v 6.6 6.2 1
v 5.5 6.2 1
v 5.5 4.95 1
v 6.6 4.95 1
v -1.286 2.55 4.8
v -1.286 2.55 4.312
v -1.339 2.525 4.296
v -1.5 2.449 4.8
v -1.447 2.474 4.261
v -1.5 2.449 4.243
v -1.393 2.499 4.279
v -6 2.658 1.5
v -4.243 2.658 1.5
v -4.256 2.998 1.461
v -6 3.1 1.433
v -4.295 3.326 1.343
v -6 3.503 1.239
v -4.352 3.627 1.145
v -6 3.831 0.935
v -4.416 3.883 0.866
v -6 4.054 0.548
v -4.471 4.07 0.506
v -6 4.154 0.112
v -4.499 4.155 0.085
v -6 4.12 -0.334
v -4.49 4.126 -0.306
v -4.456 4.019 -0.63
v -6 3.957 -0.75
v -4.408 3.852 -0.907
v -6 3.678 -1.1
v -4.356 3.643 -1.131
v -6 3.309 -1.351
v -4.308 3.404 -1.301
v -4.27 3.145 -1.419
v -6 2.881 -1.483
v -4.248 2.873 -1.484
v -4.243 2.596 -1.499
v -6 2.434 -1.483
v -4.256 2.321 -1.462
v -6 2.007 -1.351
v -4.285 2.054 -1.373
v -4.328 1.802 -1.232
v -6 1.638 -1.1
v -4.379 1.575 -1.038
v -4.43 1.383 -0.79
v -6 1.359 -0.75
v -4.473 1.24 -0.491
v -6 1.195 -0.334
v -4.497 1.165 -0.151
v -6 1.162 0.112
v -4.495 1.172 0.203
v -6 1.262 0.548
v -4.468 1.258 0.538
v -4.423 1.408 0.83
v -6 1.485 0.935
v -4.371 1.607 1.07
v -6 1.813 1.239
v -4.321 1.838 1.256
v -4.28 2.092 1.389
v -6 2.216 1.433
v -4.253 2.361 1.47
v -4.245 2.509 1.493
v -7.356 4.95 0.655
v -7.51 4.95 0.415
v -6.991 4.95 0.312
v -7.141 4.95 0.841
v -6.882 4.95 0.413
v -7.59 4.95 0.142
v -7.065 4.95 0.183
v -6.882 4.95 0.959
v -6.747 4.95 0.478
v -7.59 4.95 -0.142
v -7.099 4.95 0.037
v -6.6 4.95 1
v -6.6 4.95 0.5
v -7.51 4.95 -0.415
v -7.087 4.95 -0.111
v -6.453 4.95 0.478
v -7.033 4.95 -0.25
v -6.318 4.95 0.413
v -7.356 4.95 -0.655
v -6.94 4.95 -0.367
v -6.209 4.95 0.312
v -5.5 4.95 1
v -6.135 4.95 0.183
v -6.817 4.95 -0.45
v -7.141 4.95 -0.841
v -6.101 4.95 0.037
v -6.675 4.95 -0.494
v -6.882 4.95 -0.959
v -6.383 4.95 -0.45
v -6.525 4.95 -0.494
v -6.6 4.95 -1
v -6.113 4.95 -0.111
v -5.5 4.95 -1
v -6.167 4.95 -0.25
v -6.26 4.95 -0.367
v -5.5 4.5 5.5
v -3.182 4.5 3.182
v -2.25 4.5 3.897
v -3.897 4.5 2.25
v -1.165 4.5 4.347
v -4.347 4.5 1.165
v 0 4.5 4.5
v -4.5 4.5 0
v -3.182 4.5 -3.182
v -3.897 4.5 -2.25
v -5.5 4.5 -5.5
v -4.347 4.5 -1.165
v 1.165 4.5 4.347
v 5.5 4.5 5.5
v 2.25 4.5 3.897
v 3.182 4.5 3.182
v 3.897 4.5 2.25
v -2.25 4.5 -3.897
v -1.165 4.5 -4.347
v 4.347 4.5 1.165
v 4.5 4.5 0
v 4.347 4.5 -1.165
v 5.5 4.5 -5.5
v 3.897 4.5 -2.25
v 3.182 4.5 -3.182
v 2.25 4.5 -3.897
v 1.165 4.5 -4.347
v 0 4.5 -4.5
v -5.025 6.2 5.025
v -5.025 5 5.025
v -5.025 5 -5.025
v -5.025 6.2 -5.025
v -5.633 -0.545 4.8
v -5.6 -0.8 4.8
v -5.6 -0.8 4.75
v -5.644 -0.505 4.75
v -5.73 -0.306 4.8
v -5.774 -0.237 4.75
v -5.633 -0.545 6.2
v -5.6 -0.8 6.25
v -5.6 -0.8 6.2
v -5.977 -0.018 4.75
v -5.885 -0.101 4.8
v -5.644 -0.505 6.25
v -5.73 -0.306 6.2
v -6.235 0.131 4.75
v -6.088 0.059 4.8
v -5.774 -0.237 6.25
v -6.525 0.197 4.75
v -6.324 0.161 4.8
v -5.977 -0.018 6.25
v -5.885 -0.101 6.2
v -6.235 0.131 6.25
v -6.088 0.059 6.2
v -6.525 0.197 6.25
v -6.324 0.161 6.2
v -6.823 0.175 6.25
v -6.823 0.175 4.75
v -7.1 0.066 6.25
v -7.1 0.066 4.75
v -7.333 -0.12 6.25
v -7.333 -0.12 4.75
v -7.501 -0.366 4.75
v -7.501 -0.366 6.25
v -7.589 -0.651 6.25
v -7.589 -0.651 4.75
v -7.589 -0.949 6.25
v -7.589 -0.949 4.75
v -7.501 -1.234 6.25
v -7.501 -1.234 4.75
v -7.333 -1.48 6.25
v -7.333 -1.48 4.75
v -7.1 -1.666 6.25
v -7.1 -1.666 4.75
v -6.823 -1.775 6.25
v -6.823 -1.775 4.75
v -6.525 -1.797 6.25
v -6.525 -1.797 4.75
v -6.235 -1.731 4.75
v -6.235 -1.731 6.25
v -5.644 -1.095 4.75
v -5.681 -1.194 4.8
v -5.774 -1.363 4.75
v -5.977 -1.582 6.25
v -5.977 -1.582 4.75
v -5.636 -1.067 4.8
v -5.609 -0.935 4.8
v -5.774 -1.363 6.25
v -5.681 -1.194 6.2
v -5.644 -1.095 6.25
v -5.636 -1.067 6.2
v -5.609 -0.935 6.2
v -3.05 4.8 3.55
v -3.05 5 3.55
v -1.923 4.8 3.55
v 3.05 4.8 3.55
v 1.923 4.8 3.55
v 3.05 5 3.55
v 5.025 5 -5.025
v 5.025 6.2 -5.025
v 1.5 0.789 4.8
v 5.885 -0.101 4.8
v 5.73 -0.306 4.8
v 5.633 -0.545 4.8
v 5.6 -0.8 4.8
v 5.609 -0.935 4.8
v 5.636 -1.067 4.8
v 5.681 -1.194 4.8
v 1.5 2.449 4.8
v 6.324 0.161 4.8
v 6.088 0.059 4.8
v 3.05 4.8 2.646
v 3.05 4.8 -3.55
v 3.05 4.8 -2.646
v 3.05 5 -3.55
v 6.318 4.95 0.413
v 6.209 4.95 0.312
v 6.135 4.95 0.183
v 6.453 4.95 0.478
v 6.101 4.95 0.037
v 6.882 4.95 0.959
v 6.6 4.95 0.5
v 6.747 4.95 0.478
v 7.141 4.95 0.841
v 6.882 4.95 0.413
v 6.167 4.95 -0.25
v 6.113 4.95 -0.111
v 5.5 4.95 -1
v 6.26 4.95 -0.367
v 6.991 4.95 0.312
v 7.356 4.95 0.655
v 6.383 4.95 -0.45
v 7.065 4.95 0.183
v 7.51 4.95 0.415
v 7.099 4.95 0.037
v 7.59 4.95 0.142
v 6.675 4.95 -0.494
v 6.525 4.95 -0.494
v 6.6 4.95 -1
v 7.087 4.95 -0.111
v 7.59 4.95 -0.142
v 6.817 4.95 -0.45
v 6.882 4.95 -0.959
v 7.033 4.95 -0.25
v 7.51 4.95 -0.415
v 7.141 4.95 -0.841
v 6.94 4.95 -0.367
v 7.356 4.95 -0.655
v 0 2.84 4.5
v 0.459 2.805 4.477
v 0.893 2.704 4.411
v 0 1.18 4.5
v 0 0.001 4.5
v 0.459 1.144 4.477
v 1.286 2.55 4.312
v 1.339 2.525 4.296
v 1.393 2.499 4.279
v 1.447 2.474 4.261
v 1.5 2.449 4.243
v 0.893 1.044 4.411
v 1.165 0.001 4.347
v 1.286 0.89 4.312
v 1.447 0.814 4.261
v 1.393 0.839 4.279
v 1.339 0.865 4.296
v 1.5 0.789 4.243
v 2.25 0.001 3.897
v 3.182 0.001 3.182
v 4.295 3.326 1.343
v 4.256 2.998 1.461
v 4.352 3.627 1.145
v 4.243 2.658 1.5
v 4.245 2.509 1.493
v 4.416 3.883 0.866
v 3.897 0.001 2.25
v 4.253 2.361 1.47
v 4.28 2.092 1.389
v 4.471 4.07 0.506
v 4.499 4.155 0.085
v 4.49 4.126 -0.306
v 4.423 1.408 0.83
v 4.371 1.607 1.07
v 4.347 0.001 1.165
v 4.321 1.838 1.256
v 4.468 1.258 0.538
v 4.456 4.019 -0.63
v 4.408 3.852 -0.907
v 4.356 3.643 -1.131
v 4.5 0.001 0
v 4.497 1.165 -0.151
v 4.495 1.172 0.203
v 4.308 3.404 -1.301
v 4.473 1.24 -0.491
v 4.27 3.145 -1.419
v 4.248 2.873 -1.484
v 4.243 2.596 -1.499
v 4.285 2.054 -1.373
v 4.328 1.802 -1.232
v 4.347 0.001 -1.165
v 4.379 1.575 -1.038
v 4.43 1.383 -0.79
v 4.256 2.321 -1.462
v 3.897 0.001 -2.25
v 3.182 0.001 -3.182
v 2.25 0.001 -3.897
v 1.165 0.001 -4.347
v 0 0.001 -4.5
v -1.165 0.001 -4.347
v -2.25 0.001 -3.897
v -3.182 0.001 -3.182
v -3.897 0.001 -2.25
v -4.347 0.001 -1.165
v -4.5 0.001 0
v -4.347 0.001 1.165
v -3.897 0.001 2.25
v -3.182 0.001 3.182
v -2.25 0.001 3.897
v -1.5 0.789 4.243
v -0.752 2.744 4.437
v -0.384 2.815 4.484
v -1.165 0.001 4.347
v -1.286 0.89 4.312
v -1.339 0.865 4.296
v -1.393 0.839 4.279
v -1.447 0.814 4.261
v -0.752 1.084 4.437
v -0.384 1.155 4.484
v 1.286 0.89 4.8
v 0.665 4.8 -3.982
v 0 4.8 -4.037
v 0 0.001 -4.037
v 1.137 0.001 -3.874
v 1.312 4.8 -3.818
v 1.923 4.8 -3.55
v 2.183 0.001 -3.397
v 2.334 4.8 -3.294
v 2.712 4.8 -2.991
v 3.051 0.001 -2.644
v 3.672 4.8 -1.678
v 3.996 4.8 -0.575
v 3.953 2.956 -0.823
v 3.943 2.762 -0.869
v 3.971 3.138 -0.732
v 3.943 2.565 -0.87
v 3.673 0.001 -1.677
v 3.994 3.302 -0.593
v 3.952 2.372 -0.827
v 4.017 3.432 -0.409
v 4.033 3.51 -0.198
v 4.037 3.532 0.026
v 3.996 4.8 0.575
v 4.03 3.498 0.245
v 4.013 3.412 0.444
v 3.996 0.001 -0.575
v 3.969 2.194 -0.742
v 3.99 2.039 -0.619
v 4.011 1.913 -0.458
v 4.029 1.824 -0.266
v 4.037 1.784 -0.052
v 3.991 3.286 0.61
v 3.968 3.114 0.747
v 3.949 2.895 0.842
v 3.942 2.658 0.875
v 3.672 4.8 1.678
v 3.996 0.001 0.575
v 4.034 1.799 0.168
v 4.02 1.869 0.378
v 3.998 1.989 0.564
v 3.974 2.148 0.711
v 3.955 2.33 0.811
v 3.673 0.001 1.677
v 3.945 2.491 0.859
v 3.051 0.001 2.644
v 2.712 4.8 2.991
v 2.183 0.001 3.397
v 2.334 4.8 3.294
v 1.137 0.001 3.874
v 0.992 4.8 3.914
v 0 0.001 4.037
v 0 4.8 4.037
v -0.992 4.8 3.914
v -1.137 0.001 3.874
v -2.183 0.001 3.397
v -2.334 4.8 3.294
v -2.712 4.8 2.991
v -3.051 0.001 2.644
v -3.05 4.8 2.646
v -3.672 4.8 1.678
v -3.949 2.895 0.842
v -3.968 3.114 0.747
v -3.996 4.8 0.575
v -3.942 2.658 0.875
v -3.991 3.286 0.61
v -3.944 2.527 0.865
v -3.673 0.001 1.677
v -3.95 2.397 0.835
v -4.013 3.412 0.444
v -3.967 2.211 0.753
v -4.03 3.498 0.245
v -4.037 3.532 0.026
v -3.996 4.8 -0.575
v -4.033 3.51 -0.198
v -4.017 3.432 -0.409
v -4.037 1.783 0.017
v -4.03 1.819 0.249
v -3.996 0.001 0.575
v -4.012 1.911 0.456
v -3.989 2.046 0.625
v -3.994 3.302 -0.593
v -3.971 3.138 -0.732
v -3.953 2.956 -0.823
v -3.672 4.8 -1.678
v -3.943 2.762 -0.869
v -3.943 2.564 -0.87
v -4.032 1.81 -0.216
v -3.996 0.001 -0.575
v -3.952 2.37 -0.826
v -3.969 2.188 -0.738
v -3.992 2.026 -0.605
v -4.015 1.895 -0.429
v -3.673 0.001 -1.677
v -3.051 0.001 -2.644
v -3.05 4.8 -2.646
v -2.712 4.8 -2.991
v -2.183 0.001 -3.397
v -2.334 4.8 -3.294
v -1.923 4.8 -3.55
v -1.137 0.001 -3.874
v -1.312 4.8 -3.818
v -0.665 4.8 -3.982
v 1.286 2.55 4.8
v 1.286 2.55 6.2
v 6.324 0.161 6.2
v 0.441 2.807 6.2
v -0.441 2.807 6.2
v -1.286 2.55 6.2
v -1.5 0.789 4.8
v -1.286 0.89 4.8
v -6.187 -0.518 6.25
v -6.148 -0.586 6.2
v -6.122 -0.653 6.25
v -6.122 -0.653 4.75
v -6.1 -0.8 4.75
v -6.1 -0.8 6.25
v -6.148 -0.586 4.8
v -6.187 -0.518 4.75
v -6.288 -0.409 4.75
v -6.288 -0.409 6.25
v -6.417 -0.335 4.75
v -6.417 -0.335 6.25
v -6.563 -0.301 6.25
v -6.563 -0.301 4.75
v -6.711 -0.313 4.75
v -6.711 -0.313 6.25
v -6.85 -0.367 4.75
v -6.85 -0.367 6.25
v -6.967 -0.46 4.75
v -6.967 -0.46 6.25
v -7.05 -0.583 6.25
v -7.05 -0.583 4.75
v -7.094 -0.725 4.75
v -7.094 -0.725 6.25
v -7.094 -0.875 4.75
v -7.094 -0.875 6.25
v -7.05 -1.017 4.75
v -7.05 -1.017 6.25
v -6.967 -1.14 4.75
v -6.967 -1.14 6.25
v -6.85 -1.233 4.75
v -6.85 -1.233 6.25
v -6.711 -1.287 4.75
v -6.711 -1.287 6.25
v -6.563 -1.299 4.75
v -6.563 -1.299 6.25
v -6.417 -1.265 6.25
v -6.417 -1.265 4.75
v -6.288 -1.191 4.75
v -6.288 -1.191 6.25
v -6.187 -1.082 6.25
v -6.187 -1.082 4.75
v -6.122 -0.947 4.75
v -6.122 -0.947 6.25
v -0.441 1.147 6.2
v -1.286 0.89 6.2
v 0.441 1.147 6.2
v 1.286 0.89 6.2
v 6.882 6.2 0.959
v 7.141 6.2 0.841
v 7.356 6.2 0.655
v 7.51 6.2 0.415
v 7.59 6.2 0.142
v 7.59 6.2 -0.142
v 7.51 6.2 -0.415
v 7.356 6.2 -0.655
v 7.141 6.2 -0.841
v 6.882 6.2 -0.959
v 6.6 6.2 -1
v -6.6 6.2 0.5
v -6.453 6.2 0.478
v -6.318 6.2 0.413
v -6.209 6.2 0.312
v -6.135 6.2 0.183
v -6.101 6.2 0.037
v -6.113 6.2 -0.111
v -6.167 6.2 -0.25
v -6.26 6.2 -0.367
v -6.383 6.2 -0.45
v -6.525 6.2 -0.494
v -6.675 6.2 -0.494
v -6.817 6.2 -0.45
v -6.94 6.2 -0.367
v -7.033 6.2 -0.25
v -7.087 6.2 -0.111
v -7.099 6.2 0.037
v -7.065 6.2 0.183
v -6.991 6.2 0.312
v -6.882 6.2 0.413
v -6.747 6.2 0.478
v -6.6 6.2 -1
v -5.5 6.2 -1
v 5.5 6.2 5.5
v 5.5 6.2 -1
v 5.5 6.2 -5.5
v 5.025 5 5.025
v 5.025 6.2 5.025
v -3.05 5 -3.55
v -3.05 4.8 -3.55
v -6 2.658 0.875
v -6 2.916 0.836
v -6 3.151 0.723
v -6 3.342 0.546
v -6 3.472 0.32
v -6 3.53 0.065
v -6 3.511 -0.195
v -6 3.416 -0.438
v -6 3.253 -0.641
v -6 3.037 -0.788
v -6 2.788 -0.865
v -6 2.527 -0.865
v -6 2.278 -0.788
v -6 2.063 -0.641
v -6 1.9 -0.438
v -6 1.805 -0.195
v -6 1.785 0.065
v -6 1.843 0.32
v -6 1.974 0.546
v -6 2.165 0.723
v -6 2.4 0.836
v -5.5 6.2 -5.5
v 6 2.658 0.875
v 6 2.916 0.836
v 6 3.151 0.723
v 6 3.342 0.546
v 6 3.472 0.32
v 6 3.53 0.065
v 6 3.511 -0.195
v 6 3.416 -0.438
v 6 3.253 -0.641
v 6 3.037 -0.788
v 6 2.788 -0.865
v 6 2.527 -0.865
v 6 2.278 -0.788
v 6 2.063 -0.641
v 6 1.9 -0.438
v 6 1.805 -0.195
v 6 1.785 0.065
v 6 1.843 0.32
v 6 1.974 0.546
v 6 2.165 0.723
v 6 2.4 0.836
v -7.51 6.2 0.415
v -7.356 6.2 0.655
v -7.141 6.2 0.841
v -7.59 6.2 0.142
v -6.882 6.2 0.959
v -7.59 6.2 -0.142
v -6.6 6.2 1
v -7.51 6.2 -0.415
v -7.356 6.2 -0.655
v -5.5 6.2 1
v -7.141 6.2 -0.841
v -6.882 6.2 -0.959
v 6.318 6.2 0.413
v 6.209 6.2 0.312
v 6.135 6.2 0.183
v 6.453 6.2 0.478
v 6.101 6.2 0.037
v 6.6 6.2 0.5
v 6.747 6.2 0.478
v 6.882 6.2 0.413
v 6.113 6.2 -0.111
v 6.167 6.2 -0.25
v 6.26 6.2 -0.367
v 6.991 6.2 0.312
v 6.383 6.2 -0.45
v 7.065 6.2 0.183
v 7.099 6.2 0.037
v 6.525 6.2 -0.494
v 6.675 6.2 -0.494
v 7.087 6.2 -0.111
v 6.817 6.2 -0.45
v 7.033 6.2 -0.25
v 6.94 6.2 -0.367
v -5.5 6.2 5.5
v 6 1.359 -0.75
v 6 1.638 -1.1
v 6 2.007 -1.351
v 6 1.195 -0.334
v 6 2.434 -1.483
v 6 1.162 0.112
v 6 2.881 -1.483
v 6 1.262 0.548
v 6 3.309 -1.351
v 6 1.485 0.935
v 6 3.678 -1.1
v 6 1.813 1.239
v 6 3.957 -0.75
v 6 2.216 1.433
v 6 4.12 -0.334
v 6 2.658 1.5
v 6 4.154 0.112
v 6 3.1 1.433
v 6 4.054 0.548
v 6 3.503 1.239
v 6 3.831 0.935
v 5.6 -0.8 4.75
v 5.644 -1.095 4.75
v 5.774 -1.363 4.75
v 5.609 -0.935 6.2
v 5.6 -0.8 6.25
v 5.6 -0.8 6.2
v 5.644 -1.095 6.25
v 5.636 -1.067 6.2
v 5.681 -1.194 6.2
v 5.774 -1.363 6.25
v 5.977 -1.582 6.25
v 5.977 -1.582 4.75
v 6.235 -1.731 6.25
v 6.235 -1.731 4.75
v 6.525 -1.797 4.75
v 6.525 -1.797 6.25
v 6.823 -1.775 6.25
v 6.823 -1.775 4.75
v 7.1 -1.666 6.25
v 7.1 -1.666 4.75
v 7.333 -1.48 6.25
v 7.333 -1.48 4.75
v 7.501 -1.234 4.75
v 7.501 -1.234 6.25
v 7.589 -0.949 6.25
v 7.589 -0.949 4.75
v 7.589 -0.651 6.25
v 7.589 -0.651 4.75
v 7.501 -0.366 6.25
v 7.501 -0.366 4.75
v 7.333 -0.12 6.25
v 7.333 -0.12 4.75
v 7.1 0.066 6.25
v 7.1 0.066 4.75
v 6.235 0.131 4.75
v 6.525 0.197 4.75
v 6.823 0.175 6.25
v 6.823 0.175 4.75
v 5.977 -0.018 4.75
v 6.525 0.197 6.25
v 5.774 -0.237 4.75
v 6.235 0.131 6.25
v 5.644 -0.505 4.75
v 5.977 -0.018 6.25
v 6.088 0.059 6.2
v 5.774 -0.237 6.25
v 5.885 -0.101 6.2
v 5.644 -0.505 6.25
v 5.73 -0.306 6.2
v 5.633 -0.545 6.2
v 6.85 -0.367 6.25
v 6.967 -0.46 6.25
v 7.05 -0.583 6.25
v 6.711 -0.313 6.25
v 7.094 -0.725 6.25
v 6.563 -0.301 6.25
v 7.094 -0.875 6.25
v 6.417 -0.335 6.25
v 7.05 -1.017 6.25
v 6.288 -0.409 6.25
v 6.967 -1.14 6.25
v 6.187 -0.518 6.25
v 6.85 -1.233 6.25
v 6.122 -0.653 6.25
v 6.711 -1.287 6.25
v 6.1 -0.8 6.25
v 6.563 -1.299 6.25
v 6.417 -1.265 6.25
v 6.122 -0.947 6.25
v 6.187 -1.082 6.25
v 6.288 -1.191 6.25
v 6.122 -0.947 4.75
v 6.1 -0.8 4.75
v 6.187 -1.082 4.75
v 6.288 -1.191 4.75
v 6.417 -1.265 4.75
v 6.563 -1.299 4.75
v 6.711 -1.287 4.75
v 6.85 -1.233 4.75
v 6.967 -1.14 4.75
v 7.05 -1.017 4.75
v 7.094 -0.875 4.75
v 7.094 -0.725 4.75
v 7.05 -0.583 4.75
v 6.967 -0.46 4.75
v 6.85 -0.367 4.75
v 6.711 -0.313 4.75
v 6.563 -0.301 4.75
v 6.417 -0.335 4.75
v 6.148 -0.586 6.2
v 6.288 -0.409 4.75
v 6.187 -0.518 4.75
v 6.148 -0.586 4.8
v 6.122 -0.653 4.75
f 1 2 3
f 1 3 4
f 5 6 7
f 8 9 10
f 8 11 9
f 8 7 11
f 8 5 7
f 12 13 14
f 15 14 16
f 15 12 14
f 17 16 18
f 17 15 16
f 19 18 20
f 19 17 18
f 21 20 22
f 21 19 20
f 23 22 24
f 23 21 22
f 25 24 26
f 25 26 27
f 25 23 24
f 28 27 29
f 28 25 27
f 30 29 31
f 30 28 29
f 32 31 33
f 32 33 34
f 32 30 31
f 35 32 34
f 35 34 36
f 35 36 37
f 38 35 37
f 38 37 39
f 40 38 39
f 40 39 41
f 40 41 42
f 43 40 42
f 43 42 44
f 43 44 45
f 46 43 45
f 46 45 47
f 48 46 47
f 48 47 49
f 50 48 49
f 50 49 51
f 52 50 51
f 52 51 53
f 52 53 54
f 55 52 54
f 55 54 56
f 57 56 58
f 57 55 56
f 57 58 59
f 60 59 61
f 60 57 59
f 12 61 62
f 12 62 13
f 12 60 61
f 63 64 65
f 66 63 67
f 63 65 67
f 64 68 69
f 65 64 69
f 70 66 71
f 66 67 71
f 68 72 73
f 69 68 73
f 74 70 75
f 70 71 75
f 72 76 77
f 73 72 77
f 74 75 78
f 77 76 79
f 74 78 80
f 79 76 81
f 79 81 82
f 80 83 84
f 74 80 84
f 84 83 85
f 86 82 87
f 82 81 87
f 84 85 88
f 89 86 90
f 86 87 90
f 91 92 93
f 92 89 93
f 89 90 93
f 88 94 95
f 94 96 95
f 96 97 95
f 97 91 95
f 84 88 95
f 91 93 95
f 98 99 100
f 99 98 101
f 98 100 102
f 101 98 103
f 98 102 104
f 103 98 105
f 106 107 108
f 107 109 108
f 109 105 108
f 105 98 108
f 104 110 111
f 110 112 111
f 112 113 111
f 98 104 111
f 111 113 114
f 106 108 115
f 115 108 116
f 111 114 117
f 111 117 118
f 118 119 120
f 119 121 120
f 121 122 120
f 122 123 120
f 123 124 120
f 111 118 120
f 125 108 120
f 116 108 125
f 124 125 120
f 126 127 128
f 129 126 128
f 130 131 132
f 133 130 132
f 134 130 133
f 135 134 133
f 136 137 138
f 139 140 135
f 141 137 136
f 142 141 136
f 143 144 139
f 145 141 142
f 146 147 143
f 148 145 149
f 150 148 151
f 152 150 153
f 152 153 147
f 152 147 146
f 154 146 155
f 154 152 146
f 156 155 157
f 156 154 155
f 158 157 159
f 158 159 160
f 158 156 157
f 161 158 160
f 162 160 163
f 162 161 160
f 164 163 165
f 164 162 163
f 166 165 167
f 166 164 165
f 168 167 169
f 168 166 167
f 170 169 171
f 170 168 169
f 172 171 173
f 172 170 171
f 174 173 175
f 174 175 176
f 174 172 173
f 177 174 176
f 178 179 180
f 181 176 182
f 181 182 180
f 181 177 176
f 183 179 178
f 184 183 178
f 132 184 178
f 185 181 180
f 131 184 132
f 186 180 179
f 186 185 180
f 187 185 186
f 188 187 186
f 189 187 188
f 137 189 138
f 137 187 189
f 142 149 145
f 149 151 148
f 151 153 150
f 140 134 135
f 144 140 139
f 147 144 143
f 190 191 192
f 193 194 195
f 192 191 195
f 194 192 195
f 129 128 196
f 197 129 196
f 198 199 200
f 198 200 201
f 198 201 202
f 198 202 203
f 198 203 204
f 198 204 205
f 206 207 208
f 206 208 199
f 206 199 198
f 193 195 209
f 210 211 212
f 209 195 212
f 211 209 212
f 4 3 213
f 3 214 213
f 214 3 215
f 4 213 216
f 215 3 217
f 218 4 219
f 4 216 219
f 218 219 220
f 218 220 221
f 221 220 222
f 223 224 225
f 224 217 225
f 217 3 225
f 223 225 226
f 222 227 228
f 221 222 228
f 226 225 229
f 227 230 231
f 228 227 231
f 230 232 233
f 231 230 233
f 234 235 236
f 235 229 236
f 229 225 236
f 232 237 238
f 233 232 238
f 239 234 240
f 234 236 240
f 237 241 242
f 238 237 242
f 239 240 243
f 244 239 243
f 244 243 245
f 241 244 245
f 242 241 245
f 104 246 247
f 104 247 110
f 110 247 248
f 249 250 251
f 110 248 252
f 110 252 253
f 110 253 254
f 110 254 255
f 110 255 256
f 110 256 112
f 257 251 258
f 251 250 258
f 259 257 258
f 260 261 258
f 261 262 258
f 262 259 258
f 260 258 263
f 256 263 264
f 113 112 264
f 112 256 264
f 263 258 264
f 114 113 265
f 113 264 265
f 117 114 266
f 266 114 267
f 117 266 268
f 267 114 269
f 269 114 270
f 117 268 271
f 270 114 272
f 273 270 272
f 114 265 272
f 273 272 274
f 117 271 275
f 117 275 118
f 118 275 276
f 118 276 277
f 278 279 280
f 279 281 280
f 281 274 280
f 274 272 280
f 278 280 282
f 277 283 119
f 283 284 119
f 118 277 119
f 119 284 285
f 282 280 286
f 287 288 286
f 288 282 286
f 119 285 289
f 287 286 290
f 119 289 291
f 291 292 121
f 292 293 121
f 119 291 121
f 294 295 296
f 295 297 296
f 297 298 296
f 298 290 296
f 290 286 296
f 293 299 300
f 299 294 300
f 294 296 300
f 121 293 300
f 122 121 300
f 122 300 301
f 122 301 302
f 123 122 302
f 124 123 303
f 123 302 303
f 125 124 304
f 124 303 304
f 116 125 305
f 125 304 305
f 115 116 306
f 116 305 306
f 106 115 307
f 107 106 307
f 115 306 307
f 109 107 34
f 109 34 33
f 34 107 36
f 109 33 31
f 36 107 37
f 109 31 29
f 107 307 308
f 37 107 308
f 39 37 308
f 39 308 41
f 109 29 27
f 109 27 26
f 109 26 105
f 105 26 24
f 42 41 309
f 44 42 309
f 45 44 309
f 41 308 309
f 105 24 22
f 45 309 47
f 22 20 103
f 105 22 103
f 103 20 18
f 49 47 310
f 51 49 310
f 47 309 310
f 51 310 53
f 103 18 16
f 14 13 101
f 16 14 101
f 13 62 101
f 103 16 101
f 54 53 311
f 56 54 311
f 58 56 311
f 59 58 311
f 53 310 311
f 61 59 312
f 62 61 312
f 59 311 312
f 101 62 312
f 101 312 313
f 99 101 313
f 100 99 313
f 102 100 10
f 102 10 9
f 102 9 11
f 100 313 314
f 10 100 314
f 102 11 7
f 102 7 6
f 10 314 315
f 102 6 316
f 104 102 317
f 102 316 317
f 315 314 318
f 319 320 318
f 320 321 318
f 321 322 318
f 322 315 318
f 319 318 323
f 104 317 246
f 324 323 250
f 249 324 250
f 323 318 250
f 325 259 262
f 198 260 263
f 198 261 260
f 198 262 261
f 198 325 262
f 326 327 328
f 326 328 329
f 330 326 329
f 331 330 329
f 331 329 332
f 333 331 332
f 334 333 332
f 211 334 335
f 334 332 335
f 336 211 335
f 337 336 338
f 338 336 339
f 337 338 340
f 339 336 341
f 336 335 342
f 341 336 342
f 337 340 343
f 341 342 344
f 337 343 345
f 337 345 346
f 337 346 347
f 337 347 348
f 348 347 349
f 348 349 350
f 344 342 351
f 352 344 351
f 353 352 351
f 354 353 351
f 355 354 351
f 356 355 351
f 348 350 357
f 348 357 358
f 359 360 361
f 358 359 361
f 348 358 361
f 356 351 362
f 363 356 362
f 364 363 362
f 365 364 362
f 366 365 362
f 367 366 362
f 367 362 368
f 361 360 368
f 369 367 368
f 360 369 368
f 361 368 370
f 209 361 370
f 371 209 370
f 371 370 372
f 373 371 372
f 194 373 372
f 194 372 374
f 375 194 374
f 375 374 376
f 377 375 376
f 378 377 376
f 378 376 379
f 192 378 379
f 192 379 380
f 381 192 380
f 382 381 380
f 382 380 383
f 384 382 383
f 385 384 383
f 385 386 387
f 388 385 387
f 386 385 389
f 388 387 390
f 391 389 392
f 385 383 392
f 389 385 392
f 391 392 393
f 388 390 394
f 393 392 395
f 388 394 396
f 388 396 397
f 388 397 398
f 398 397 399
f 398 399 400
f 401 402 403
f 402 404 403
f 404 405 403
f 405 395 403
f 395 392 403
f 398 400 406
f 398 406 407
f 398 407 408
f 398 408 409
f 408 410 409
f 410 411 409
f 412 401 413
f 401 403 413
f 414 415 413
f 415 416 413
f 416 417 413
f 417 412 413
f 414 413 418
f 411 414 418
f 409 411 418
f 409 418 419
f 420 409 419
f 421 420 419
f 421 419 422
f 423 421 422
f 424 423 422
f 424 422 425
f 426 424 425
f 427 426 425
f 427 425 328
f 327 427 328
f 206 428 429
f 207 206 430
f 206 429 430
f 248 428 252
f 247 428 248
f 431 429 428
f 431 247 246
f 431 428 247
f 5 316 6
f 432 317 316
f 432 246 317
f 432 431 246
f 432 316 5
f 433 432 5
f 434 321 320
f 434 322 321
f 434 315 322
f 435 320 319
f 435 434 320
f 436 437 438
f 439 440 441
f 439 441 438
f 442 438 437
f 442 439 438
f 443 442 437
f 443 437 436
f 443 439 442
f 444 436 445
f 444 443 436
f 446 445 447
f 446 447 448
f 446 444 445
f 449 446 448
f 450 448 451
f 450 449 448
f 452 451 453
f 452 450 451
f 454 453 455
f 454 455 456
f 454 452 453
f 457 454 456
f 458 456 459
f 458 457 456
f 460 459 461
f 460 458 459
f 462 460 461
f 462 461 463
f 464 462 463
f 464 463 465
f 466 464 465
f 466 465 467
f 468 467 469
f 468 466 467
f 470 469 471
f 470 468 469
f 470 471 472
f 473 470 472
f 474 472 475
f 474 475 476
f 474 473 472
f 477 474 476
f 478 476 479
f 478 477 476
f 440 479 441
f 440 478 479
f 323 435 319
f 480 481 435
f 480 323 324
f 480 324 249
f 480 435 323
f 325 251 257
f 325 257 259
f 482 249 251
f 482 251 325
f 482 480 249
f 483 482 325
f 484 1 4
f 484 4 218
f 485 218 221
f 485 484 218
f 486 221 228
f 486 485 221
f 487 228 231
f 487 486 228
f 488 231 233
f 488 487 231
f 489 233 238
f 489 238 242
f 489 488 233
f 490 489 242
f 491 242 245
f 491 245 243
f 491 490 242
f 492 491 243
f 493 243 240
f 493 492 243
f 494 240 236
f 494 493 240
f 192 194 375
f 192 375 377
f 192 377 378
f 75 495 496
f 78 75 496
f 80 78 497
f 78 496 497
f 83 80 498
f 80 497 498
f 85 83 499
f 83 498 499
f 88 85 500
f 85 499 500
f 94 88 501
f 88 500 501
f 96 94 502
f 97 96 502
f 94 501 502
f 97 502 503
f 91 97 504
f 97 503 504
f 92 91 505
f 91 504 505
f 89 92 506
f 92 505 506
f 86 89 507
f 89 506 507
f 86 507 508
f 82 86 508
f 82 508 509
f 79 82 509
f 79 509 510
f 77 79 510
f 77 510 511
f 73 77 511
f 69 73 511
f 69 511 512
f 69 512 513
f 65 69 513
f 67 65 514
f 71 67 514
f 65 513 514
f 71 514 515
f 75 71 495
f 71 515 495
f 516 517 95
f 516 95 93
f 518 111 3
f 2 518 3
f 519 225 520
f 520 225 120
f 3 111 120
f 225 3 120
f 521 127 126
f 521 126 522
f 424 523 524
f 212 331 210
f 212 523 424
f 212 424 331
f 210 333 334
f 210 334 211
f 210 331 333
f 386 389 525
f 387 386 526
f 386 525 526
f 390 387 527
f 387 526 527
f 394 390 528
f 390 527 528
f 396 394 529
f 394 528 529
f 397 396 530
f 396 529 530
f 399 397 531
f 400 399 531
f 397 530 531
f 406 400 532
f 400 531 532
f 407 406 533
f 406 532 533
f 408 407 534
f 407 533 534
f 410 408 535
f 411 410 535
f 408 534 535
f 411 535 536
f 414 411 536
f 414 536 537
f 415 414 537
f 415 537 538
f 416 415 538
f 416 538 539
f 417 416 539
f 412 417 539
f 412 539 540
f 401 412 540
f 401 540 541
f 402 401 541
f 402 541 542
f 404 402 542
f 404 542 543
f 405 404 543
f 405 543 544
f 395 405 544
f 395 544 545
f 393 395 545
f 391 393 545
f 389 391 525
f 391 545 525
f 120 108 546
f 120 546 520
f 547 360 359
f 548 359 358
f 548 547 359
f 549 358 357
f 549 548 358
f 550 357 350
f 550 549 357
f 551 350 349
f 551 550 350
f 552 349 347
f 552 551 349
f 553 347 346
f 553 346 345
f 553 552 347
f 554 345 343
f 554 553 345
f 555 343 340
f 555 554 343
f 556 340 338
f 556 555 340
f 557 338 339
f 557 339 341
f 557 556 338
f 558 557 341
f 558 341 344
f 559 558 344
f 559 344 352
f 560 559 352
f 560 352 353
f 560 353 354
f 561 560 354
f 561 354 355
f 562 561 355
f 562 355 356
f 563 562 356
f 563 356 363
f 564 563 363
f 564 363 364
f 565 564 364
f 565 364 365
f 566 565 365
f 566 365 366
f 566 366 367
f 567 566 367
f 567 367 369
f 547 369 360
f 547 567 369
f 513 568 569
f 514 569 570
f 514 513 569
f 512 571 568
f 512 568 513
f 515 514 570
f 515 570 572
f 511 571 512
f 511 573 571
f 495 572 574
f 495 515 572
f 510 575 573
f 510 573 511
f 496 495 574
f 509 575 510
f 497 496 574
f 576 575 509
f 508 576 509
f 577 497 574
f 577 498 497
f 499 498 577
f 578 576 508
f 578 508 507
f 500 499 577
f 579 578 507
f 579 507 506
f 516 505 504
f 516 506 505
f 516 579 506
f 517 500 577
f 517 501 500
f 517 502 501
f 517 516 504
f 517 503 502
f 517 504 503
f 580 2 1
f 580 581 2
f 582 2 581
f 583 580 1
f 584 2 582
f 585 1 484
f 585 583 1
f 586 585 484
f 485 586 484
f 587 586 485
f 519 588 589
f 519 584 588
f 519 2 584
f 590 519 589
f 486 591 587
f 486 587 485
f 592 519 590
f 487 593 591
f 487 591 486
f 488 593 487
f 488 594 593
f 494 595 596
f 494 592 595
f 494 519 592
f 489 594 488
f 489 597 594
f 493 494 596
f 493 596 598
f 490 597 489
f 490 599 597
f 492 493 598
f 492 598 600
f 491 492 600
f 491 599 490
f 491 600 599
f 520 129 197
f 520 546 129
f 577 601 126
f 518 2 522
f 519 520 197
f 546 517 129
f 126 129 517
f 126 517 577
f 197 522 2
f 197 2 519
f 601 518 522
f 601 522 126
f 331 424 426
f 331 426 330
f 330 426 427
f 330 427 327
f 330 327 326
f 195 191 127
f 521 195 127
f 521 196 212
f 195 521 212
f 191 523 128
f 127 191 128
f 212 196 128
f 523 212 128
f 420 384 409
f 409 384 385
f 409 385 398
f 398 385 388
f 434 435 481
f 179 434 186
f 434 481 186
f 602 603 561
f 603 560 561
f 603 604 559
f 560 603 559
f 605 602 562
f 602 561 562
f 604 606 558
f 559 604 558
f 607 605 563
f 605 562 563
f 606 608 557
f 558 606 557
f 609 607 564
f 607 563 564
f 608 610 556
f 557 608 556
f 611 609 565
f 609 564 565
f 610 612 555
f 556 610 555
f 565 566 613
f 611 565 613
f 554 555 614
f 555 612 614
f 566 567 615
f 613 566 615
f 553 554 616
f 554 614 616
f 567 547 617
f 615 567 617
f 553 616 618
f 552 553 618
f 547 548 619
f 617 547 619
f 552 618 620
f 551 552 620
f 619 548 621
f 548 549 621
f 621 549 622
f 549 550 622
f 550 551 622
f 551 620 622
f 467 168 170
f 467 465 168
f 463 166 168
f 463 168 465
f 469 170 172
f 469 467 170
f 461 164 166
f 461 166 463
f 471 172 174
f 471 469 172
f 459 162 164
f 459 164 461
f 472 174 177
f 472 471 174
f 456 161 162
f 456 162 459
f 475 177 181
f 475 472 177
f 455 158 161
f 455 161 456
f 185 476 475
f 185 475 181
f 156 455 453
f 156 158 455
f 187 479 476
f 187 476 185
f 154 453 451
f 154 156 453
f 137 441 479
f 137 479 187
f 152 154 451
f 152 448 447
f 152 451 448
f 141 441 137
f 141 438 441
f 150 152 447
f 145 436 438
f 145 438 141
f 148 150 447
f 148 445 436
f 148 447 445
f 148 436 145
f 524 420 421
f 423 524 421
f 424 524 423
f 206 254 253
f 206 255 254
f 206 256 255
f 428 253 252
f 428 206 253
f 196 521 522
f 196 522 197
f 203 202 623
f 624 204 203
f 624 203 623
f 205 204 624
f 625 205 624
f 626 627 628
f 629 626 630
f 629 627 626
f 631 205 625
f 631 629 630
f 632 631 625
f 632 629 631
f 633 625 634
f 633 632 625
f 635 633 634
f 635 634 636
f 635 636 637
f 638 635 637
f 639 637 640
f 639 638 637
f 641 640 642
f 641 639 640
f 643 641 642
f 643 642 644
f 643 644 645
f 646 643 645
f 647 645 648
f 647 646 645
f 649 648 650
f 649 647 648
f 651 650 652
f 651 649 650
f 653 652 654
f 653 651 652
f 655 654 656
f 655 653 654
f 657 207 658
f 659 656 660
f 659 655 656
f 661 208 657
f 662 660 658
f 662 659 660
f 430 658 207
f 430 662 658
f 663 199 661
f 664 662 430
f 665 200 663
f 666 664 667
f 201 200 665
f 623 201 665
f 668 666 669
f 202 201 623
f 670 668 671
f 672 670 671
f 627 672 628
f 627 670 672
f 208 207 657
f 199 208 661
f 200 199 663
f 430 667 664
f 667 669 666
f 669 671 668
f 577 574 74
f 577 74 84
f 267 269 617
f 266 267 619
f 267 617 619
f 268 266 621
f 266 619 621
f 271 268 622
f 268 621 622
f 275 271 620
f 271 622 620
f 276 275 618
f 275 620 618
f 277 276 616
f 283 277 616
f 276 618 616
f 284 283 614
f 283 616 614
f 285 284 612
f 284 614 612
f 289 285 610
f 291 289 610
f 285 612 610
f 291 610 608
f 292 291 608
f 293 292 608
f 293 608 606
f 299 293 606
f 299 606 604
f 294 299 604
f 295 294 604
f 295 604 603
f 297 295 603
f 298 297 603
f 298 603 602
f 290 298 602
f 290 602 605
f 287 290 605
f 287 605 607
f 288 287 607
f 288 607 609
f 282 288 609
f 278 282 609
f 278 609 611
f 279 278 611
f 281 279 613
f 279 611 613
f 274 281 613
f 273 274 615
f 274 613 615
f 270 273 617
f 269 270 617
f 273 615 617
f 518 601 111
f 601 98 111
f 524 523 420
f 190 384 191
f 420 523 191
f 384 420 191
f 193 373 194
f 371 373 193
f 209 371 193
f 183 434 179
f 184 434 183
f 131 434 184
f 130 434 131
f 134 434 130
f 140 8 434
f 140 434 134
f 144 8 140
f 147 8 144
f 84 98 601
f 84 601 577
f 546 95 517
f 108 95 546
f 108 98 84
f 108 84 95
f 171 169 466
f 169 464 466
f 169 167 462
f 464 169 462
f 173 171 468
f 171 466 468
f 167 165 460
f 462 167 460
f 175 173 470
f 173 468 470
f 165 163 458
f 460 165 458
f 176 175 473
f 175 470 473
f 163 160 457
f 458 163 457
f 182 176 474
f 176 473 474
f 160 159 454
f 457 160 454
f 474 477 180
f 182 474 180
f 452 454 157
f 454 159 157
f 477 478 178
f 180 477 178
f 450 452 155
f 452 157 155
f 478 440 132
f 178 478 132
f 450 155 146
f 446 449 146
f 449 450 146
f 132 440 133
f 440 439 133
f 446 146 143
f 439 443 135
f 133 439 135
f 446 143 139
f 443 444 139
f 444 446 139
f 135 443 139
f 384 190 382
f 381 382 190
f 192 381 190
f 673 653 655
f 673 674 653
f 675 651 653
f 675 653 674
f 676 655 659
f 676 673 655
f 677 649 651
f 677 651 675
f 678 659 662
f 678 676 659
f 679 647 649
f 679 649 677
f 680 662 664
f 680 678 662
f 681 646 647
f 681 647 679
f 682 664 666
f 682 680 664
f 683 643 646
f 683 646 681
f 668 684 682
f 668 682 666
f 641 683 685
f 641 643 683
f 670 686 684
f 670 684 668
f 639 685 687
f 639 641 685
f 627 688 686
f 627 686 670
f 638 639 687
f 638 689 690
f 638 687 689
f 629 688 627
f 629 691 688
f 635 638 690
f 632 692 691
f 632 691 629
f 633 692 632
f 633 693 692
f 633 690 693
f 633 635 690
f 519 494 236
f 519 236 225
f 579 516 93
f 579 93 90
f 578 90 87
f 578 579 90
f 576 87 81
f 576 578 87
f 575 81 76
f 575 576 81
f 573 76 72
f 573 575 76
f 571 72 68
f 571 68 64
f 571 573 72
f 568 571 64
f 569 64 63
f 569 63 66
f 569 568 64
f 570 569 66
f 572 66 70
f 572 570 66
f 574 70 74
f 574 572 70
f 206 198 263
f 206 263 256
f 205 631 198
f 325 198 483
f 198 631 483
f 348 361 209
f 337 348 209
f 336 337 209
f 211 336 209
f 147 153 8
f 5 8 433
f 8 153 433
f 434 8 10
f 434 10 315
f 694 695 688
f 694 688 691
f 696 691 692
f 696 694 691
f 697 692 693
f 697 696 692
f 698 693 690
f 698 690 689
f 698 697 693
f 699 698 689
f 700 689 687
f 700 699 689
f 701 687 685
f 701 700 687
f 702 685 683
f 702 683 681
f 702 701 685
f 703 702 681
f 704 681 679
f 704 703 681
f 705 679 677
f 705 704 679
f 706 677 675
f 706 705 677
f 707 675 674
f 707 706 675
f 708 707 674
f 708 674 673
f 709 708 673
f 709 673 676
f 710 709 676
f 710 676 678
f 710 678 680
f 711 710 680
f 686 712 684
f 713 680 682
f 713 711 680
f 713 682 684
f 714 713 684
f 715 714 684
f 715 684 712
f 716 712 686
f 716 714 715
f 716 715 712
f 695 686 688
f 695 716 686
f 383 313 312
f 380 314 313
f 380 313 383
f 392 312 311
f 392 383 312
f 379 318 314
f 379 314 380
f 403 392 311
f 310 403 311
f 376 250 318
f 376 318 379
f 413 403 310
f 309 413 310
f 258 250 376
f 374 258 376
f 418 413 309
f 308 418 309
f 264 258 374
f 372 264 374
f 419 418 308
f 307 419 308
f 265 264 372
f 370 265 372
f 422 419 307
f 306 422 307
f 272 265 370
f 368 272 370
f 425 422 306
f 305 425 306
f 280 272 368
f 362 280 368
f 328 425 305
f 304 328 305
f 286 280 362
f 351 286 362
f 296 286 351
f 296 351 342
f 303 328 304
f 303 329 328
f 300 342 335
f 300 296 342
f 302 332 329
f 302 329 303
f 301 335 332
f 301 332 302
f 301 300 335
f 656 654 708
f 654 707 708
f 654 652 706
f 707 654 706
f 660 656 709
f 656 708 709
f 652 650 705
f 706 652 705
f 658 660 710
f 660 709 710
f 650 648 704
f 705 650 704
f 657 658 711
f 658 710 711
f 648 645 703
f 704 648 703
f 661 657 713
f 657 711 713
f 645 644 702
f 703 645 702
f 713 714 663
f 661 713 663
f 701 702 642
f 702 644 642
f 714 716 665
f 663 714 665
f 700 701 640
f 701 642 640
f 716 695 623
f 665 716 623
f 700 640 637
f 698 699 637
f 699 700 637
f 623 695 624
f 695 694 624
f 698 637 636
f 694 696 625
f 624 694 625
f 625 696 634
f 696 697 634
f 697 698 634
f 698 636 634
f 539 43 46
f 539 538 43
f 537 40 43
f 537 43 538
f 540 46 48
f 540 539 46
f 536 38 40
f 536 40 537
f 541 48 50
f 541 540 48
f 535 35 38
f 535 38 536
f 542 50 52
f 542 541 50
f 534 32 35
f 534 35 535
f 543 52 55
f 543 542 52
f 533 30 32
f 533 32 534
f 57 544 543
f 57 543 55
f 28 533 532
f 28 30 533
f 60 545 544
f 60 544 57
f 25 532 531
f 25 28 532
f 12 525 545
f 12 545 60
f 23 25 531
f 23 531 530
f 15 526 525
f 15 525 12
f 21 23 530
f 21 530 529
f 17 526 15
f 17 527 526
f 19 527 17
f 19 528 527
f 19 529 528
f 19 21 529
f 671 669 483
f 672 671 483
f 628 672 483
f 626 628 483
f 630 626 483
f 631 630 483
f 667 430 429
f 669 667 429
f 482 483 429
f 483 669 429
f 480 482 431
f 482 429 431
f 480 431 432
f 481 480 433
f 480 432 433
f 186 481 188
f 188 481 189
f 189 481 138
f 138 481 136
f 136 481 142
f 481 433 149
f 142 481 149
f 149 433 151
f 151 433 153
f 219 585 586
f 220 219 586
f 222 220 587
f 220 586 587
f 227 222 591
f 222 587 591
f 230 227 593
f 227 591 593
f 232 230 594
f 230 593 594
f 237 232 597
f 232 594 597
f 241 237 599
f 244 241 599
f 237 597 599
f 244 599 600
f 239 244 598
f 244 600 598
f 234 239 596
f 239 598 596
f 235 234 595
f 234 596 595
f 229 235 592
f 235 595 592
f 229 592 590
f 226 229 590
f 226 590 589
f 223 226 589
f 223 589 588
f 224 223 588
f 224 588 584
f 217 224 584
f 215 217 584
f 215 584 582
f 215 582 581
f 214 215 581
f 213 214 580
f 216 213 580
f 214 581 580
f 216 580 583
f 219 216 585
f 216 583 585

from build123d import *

# Parameters (mm, degrees)
SKETCH_1_R          = 4.5
SKETCH_1_R_2        = 4
EXTRUDE_1_DEPTH     = 4.5
SKETCH_2_W          = 11
SKETCH_2_H          = 11
SKETCH_2_R          = 4
EXTRUDE_2_DEPTH     = 0.5
SKETCH_3_W          = 6.1
SKETCH_3_H          = 7.1
CUT_EXTRUDE_1_DEPTH = 0.2
SKETCH_4_W          = 11
SKETCH_4_H          = 11
SKETCH_4_W_2        = 10.05
SKETCH_4_H_2        = 10.05
EXTRUDE_3_DEPTH     = 1.2
SKETCH_5_R          = 0.5
EXTRUDE_4_DEPTH     = 1.25
SKETCH_6_R          = 1
SKETCH_6_R_2        = 0.5
EXTRUDE_5_DEPTH     = 0.75
EXTRUDE_5_2_DEPTH   = 0.75
EXTRUDE_6_DEPTH     = 0.7
FILLET_1_R          = 3
EXTRUDE_7_DEPTH     = 0.9
EXTRUDE_8_DEPTH     = 0.2
SKETCH_12_R         = 4.5
CUT_EXTRUDE_2_DEPTH = 0.001
SKETCH_13_R         = 4.0375
CUT_EXTRUDE_3_DEPTH = 4.799
SKETCH_20_R         = 1.5
EXTRUDE_10_DEPTH    = 1.8
SKETCH_21_R         = 0.875
CUT_EXTRUDE_5_DEPTH = 3


with BuildPart() as part:
    # 草图1 → 凸台-拉伸1 (new body)
    with BuildSketch(Plane(origin=(0, 0, 0), x_dir=(1, 0, 0), z_dir=(0, 1, 0))):
        with Locations(Location((0, 0, 0), (0, 0, 270))):
            Circle(SKETCH_1_R)
        with Locations(Location((0, 0, 0), (0, 0, 270))):
            Circle(SKETCH_1_R_2, mode=Mode.SUBTRACT)
    extrude(amount=EXTRUDE_1_DEPTH)

    # 草图2 → 凸台-拉伸2 (add)
    with BuildSketch(Plane(origin=(0, 4.5, 0), x_dir=(1, 0, 0), z_dir=(0, 1, 0))):
        Rectangle(SKETCH_2_W, SKETCH_2_H)
        with Locations(Location((0, 0, 0), (0, 0, 270))):
            Circle(SKETCH_2_R, mode=Mode.SUBTRACT)
    extrude(amount=EXTRUDE_2_DEPTH)

    # 草图3 → 切除-拉伸1 (cut)
    with BuildSketch(Plane(origin=(0, 5, 0), x_dir=(1, 0, 0), z_dir=(0, 1, 0))):
        Rectangle(SKETCH_3_W, SKETCH_3_H)
    extrude(amount=-CUT_EXTRUDE_1_DEPTH, mode=Mode.SUBTRACT)

    # 草图4 → 凸台-拉伸3 (add)
    with BuildSketch(Plane(origin=(0, 5, 0), x_dir=(1, 0, 0), z_dir=(0, 1, 0))):
        Rectangle(SKETCH_4_W, SKETCH_4_H)
        Rectangle(SKETCH_4_W_2, SKETCH_4_H_2, mode=Mode.SUBTRACT)
    extrude(amount=EXTRUDE_3_DEPTH)

    # 草图5 → 凸台-拉伸4 (add)
    with BuildSketch(Plane(origin=(0, 6.2, 0), x_dir=(1, 0, 0), z_dir=(0, 1, 0))):
        with BuildLine():
            Line((5.5, 1), (5.5, -1))
            Line((5.5, -1), (6.6, -1))
            ThreePointArc((6.6, -1), (7.6, 0), (6.6, 1))
            Line((6.6, 1), (5.5, 1))
        make_face()
        with Locations(Location((6.6, 0, 0), (0, 0, 270))):
            Circle(SKETCH_5_R, mode=Mode.SUBTRACT)
        with BuildLine():
            Line((-6.6, -1), (-5.5, -1))
            Line((-5.5, -1), (-5.5, 1))
            Line((-5.5, 1), (-6.6, 1))
            ThreePointArc((-6.6, 1), (-7.6, 0), (-6.6, -1))
        make_face()
        with Locations(Location((-6.6, 0, 0), (0, 0, 270))):
            Circle(SKETCH_5_R, mode=Mode.SUBTRACT)
    extrude(amount=-EXTRUDE_4_DEPTH)



with BuildPart() as body_2:
    # 草图6 → 凸台-拉伸5 (new, symmetric)
    with BuildSketch(Plane.XY.offset(5.5)):
        with Locations((-6.6, -0.8)):
            Circle(SKETCH_6_R)
        with Locations((-6.6, -0.8)):
            Circle(SKETCH_6_R_2, mode=Mode.SUBTRACT)
    extrude(amount=EXTRUDE_5_DEPTH, both=True)



with BuildPart() as body_3:
    # 草图6 → Extrude 5 2 (new, symmetric)
    with BuildSketch(Plane.XY.offset(5.5)):
        with Locations(Location((6.6, -0.8, 0), (0, 0, 180))):
            Circle(SKETCH_6_R)
        with Locations(Location((6.6, -0.8, 0), (0, 0, 180))):
            Circle(SKETCH_6_R_2, mode=Mode.SUBTRACT)
    extrude(amount=EXTRUDE_5_2_DEPTH, both=True)


with BuildPart() as body_2_1:
    add(body_2.part)

    add(body_3.part)  # 凸台-拉伸6 merges body 3
    # 草图7 → 凸台-拉伸6 (add, symmetric)
    with BuildSketch(Plane.XY.offset(5.5)):
        Polygon((-6.469610026, 0.091907201), (0, 3.160138746), (6.469610026, 0.091907201), (5.826851035, -1.263401207), (0, 1.5), (-5.826851035, -1.263401207), align=None)
    extrude(amount=EXTRUDE_6_DEPTH, both=True)

    # 圆角1
    fillet_1_edges = [body_2_1.edges().sort_by_distance(p)[0] for p in [
        (0, 1.5, 5.5),
        (0, 3.160138746, 5.5),
    ]]
    fillet(fillet_1_edges, radius=FILLET_1_R)


with BuildPart() as part_1:
    add(part.part)

    add(body_2_1.part)  # 凸台-拉伸7 merges body 2
    # 草图8 → 凸台-拉伸7 (add)
    with BuildSketch(Plane(origin=(0, 0, 4.8), x_dir=(-1, 0, 0), z_dir=(0, 0, -1))):
        with BuildLine():
            Line((1.5, 2.448759343), (1.5, 0.788620597))
            Line((1.5, 0.788620597), (1.285517981, 0.890339324))
            ThreePointArc((1.285517981, 0.890339324), (0, 1.179722509), (-1.285517981, 0.890339324))
            Line((-1.285517981, 0.890339324), (-1.5, 0.788620597))
            Line((-1.5, 0.788620597), (-1.5, 2.448759343))
            Line((-1.5, 2.448759343), (-1.285517981, 2.55047807))
            ThreePointArc((-1.285517981, 2.55047807), (0, 2.839861254), (1.285517981, 2.55047807))
            Line((1.285517981, 2.55047807), (1.5, 2.448759343))
        make_face()
    extrude(amount=EXTRUDE_7_DEPTH)

    # 草图11 → 凸台-拉伸8 (add)
    with BuildSketch(Plane(origin=(0, 5, 0), x_dir=(1, 0, 0), z_dir=(0, 1, 0))):
        with BuildLine():
            Line((-3.05, 2.587952859), (-3.05, -2.587952859))
            ThreePointArc((-3.05, -2.587952859), (-4, 0), (-3.05, 2.587952859))
        make_face()
        with BuildLine():
            Line((3.05, 2.587952859), (3.05, -2.587952859))
            ThreePointArc((3.05, -2.587952859), (4, 0), (3.05, 2.587952859))
        make_face()
        with BuildLine():
            Line((-1.843230859, 3.55), (1.843230859, 3.55))
            ThreePointArc((1.843230859, 3.55), (0, 4), (-1.843230859, 3.55))
        make_face()
        with BuildLine():
            Line((-1.843230859, -3.55), (1.843230859, -3.55))
            ThreePointArc((1.843230859, -3.55), (0, -4), (-1.843230859, -3.55))
        make_face()
    extrude(amount=-EXTRUDE_8_DEPTH)

    # 草图12 → 切除-拉伸2 (cut)
    with BuildSketch(Plane.XZ):
        with Locations(Location((0, 0, 0), (0, 0, 270))):
            Circle(SKETCH_12_R)
    extrude(amount=-CUT_EXTRUDE_2_DEPTH, mode=Mode.SUBTRACT)

    # 草图13 → 切除-拉伸3 (cut)
    with BuildSketch(Plane.XZ.offset(-0.001)):
        with Locations(Location((0, 0, 0), (0, 0, 270))):
            Circle(SKETCH_13_R)
    extrude(amount=-CUT_EXTRUDE_3_DEPTH, mode=Mode.SUBTRACT)

    # 草图20 → 凸台-拉伸10 (add)
    with BuildSketch(Plane.ZY.offset(6)):
        with Locations((0, 2.657828557)):
            Circle(SKETCH_20_R)
    extrude_10 = extrude(amount=-EXTRUDE_10_DEPTH)

    # 草图21 → 切除-拉伸5 (cut)
    with BuildSketch(Plane.ZY.offset(6)):
        with Locations((0, 2.657828557)):
            Circle(SKETCH_21_R)
    cut_extrude_5 = extrude(amount=-CUT_EXTRUDE_5_DEPTH, mode=Mode.SUBTRACT)

    # 镜向3: 凸台-拉伸10, 切除-拉伸5 across plane
    add(extrude_10.mirror(Plane(origin=(0, 0, 0), x_dir=(0, 0, 1), z_dir=(1, 0, 0))))
    add(cut_extrude_5.mirror(Plane(origin=(0, 0, 0), x_dir=(0, 0, 1), z_dir=(1, 0, 0))), mode=Mode.SUBTRACT)


solid = part_1.part
